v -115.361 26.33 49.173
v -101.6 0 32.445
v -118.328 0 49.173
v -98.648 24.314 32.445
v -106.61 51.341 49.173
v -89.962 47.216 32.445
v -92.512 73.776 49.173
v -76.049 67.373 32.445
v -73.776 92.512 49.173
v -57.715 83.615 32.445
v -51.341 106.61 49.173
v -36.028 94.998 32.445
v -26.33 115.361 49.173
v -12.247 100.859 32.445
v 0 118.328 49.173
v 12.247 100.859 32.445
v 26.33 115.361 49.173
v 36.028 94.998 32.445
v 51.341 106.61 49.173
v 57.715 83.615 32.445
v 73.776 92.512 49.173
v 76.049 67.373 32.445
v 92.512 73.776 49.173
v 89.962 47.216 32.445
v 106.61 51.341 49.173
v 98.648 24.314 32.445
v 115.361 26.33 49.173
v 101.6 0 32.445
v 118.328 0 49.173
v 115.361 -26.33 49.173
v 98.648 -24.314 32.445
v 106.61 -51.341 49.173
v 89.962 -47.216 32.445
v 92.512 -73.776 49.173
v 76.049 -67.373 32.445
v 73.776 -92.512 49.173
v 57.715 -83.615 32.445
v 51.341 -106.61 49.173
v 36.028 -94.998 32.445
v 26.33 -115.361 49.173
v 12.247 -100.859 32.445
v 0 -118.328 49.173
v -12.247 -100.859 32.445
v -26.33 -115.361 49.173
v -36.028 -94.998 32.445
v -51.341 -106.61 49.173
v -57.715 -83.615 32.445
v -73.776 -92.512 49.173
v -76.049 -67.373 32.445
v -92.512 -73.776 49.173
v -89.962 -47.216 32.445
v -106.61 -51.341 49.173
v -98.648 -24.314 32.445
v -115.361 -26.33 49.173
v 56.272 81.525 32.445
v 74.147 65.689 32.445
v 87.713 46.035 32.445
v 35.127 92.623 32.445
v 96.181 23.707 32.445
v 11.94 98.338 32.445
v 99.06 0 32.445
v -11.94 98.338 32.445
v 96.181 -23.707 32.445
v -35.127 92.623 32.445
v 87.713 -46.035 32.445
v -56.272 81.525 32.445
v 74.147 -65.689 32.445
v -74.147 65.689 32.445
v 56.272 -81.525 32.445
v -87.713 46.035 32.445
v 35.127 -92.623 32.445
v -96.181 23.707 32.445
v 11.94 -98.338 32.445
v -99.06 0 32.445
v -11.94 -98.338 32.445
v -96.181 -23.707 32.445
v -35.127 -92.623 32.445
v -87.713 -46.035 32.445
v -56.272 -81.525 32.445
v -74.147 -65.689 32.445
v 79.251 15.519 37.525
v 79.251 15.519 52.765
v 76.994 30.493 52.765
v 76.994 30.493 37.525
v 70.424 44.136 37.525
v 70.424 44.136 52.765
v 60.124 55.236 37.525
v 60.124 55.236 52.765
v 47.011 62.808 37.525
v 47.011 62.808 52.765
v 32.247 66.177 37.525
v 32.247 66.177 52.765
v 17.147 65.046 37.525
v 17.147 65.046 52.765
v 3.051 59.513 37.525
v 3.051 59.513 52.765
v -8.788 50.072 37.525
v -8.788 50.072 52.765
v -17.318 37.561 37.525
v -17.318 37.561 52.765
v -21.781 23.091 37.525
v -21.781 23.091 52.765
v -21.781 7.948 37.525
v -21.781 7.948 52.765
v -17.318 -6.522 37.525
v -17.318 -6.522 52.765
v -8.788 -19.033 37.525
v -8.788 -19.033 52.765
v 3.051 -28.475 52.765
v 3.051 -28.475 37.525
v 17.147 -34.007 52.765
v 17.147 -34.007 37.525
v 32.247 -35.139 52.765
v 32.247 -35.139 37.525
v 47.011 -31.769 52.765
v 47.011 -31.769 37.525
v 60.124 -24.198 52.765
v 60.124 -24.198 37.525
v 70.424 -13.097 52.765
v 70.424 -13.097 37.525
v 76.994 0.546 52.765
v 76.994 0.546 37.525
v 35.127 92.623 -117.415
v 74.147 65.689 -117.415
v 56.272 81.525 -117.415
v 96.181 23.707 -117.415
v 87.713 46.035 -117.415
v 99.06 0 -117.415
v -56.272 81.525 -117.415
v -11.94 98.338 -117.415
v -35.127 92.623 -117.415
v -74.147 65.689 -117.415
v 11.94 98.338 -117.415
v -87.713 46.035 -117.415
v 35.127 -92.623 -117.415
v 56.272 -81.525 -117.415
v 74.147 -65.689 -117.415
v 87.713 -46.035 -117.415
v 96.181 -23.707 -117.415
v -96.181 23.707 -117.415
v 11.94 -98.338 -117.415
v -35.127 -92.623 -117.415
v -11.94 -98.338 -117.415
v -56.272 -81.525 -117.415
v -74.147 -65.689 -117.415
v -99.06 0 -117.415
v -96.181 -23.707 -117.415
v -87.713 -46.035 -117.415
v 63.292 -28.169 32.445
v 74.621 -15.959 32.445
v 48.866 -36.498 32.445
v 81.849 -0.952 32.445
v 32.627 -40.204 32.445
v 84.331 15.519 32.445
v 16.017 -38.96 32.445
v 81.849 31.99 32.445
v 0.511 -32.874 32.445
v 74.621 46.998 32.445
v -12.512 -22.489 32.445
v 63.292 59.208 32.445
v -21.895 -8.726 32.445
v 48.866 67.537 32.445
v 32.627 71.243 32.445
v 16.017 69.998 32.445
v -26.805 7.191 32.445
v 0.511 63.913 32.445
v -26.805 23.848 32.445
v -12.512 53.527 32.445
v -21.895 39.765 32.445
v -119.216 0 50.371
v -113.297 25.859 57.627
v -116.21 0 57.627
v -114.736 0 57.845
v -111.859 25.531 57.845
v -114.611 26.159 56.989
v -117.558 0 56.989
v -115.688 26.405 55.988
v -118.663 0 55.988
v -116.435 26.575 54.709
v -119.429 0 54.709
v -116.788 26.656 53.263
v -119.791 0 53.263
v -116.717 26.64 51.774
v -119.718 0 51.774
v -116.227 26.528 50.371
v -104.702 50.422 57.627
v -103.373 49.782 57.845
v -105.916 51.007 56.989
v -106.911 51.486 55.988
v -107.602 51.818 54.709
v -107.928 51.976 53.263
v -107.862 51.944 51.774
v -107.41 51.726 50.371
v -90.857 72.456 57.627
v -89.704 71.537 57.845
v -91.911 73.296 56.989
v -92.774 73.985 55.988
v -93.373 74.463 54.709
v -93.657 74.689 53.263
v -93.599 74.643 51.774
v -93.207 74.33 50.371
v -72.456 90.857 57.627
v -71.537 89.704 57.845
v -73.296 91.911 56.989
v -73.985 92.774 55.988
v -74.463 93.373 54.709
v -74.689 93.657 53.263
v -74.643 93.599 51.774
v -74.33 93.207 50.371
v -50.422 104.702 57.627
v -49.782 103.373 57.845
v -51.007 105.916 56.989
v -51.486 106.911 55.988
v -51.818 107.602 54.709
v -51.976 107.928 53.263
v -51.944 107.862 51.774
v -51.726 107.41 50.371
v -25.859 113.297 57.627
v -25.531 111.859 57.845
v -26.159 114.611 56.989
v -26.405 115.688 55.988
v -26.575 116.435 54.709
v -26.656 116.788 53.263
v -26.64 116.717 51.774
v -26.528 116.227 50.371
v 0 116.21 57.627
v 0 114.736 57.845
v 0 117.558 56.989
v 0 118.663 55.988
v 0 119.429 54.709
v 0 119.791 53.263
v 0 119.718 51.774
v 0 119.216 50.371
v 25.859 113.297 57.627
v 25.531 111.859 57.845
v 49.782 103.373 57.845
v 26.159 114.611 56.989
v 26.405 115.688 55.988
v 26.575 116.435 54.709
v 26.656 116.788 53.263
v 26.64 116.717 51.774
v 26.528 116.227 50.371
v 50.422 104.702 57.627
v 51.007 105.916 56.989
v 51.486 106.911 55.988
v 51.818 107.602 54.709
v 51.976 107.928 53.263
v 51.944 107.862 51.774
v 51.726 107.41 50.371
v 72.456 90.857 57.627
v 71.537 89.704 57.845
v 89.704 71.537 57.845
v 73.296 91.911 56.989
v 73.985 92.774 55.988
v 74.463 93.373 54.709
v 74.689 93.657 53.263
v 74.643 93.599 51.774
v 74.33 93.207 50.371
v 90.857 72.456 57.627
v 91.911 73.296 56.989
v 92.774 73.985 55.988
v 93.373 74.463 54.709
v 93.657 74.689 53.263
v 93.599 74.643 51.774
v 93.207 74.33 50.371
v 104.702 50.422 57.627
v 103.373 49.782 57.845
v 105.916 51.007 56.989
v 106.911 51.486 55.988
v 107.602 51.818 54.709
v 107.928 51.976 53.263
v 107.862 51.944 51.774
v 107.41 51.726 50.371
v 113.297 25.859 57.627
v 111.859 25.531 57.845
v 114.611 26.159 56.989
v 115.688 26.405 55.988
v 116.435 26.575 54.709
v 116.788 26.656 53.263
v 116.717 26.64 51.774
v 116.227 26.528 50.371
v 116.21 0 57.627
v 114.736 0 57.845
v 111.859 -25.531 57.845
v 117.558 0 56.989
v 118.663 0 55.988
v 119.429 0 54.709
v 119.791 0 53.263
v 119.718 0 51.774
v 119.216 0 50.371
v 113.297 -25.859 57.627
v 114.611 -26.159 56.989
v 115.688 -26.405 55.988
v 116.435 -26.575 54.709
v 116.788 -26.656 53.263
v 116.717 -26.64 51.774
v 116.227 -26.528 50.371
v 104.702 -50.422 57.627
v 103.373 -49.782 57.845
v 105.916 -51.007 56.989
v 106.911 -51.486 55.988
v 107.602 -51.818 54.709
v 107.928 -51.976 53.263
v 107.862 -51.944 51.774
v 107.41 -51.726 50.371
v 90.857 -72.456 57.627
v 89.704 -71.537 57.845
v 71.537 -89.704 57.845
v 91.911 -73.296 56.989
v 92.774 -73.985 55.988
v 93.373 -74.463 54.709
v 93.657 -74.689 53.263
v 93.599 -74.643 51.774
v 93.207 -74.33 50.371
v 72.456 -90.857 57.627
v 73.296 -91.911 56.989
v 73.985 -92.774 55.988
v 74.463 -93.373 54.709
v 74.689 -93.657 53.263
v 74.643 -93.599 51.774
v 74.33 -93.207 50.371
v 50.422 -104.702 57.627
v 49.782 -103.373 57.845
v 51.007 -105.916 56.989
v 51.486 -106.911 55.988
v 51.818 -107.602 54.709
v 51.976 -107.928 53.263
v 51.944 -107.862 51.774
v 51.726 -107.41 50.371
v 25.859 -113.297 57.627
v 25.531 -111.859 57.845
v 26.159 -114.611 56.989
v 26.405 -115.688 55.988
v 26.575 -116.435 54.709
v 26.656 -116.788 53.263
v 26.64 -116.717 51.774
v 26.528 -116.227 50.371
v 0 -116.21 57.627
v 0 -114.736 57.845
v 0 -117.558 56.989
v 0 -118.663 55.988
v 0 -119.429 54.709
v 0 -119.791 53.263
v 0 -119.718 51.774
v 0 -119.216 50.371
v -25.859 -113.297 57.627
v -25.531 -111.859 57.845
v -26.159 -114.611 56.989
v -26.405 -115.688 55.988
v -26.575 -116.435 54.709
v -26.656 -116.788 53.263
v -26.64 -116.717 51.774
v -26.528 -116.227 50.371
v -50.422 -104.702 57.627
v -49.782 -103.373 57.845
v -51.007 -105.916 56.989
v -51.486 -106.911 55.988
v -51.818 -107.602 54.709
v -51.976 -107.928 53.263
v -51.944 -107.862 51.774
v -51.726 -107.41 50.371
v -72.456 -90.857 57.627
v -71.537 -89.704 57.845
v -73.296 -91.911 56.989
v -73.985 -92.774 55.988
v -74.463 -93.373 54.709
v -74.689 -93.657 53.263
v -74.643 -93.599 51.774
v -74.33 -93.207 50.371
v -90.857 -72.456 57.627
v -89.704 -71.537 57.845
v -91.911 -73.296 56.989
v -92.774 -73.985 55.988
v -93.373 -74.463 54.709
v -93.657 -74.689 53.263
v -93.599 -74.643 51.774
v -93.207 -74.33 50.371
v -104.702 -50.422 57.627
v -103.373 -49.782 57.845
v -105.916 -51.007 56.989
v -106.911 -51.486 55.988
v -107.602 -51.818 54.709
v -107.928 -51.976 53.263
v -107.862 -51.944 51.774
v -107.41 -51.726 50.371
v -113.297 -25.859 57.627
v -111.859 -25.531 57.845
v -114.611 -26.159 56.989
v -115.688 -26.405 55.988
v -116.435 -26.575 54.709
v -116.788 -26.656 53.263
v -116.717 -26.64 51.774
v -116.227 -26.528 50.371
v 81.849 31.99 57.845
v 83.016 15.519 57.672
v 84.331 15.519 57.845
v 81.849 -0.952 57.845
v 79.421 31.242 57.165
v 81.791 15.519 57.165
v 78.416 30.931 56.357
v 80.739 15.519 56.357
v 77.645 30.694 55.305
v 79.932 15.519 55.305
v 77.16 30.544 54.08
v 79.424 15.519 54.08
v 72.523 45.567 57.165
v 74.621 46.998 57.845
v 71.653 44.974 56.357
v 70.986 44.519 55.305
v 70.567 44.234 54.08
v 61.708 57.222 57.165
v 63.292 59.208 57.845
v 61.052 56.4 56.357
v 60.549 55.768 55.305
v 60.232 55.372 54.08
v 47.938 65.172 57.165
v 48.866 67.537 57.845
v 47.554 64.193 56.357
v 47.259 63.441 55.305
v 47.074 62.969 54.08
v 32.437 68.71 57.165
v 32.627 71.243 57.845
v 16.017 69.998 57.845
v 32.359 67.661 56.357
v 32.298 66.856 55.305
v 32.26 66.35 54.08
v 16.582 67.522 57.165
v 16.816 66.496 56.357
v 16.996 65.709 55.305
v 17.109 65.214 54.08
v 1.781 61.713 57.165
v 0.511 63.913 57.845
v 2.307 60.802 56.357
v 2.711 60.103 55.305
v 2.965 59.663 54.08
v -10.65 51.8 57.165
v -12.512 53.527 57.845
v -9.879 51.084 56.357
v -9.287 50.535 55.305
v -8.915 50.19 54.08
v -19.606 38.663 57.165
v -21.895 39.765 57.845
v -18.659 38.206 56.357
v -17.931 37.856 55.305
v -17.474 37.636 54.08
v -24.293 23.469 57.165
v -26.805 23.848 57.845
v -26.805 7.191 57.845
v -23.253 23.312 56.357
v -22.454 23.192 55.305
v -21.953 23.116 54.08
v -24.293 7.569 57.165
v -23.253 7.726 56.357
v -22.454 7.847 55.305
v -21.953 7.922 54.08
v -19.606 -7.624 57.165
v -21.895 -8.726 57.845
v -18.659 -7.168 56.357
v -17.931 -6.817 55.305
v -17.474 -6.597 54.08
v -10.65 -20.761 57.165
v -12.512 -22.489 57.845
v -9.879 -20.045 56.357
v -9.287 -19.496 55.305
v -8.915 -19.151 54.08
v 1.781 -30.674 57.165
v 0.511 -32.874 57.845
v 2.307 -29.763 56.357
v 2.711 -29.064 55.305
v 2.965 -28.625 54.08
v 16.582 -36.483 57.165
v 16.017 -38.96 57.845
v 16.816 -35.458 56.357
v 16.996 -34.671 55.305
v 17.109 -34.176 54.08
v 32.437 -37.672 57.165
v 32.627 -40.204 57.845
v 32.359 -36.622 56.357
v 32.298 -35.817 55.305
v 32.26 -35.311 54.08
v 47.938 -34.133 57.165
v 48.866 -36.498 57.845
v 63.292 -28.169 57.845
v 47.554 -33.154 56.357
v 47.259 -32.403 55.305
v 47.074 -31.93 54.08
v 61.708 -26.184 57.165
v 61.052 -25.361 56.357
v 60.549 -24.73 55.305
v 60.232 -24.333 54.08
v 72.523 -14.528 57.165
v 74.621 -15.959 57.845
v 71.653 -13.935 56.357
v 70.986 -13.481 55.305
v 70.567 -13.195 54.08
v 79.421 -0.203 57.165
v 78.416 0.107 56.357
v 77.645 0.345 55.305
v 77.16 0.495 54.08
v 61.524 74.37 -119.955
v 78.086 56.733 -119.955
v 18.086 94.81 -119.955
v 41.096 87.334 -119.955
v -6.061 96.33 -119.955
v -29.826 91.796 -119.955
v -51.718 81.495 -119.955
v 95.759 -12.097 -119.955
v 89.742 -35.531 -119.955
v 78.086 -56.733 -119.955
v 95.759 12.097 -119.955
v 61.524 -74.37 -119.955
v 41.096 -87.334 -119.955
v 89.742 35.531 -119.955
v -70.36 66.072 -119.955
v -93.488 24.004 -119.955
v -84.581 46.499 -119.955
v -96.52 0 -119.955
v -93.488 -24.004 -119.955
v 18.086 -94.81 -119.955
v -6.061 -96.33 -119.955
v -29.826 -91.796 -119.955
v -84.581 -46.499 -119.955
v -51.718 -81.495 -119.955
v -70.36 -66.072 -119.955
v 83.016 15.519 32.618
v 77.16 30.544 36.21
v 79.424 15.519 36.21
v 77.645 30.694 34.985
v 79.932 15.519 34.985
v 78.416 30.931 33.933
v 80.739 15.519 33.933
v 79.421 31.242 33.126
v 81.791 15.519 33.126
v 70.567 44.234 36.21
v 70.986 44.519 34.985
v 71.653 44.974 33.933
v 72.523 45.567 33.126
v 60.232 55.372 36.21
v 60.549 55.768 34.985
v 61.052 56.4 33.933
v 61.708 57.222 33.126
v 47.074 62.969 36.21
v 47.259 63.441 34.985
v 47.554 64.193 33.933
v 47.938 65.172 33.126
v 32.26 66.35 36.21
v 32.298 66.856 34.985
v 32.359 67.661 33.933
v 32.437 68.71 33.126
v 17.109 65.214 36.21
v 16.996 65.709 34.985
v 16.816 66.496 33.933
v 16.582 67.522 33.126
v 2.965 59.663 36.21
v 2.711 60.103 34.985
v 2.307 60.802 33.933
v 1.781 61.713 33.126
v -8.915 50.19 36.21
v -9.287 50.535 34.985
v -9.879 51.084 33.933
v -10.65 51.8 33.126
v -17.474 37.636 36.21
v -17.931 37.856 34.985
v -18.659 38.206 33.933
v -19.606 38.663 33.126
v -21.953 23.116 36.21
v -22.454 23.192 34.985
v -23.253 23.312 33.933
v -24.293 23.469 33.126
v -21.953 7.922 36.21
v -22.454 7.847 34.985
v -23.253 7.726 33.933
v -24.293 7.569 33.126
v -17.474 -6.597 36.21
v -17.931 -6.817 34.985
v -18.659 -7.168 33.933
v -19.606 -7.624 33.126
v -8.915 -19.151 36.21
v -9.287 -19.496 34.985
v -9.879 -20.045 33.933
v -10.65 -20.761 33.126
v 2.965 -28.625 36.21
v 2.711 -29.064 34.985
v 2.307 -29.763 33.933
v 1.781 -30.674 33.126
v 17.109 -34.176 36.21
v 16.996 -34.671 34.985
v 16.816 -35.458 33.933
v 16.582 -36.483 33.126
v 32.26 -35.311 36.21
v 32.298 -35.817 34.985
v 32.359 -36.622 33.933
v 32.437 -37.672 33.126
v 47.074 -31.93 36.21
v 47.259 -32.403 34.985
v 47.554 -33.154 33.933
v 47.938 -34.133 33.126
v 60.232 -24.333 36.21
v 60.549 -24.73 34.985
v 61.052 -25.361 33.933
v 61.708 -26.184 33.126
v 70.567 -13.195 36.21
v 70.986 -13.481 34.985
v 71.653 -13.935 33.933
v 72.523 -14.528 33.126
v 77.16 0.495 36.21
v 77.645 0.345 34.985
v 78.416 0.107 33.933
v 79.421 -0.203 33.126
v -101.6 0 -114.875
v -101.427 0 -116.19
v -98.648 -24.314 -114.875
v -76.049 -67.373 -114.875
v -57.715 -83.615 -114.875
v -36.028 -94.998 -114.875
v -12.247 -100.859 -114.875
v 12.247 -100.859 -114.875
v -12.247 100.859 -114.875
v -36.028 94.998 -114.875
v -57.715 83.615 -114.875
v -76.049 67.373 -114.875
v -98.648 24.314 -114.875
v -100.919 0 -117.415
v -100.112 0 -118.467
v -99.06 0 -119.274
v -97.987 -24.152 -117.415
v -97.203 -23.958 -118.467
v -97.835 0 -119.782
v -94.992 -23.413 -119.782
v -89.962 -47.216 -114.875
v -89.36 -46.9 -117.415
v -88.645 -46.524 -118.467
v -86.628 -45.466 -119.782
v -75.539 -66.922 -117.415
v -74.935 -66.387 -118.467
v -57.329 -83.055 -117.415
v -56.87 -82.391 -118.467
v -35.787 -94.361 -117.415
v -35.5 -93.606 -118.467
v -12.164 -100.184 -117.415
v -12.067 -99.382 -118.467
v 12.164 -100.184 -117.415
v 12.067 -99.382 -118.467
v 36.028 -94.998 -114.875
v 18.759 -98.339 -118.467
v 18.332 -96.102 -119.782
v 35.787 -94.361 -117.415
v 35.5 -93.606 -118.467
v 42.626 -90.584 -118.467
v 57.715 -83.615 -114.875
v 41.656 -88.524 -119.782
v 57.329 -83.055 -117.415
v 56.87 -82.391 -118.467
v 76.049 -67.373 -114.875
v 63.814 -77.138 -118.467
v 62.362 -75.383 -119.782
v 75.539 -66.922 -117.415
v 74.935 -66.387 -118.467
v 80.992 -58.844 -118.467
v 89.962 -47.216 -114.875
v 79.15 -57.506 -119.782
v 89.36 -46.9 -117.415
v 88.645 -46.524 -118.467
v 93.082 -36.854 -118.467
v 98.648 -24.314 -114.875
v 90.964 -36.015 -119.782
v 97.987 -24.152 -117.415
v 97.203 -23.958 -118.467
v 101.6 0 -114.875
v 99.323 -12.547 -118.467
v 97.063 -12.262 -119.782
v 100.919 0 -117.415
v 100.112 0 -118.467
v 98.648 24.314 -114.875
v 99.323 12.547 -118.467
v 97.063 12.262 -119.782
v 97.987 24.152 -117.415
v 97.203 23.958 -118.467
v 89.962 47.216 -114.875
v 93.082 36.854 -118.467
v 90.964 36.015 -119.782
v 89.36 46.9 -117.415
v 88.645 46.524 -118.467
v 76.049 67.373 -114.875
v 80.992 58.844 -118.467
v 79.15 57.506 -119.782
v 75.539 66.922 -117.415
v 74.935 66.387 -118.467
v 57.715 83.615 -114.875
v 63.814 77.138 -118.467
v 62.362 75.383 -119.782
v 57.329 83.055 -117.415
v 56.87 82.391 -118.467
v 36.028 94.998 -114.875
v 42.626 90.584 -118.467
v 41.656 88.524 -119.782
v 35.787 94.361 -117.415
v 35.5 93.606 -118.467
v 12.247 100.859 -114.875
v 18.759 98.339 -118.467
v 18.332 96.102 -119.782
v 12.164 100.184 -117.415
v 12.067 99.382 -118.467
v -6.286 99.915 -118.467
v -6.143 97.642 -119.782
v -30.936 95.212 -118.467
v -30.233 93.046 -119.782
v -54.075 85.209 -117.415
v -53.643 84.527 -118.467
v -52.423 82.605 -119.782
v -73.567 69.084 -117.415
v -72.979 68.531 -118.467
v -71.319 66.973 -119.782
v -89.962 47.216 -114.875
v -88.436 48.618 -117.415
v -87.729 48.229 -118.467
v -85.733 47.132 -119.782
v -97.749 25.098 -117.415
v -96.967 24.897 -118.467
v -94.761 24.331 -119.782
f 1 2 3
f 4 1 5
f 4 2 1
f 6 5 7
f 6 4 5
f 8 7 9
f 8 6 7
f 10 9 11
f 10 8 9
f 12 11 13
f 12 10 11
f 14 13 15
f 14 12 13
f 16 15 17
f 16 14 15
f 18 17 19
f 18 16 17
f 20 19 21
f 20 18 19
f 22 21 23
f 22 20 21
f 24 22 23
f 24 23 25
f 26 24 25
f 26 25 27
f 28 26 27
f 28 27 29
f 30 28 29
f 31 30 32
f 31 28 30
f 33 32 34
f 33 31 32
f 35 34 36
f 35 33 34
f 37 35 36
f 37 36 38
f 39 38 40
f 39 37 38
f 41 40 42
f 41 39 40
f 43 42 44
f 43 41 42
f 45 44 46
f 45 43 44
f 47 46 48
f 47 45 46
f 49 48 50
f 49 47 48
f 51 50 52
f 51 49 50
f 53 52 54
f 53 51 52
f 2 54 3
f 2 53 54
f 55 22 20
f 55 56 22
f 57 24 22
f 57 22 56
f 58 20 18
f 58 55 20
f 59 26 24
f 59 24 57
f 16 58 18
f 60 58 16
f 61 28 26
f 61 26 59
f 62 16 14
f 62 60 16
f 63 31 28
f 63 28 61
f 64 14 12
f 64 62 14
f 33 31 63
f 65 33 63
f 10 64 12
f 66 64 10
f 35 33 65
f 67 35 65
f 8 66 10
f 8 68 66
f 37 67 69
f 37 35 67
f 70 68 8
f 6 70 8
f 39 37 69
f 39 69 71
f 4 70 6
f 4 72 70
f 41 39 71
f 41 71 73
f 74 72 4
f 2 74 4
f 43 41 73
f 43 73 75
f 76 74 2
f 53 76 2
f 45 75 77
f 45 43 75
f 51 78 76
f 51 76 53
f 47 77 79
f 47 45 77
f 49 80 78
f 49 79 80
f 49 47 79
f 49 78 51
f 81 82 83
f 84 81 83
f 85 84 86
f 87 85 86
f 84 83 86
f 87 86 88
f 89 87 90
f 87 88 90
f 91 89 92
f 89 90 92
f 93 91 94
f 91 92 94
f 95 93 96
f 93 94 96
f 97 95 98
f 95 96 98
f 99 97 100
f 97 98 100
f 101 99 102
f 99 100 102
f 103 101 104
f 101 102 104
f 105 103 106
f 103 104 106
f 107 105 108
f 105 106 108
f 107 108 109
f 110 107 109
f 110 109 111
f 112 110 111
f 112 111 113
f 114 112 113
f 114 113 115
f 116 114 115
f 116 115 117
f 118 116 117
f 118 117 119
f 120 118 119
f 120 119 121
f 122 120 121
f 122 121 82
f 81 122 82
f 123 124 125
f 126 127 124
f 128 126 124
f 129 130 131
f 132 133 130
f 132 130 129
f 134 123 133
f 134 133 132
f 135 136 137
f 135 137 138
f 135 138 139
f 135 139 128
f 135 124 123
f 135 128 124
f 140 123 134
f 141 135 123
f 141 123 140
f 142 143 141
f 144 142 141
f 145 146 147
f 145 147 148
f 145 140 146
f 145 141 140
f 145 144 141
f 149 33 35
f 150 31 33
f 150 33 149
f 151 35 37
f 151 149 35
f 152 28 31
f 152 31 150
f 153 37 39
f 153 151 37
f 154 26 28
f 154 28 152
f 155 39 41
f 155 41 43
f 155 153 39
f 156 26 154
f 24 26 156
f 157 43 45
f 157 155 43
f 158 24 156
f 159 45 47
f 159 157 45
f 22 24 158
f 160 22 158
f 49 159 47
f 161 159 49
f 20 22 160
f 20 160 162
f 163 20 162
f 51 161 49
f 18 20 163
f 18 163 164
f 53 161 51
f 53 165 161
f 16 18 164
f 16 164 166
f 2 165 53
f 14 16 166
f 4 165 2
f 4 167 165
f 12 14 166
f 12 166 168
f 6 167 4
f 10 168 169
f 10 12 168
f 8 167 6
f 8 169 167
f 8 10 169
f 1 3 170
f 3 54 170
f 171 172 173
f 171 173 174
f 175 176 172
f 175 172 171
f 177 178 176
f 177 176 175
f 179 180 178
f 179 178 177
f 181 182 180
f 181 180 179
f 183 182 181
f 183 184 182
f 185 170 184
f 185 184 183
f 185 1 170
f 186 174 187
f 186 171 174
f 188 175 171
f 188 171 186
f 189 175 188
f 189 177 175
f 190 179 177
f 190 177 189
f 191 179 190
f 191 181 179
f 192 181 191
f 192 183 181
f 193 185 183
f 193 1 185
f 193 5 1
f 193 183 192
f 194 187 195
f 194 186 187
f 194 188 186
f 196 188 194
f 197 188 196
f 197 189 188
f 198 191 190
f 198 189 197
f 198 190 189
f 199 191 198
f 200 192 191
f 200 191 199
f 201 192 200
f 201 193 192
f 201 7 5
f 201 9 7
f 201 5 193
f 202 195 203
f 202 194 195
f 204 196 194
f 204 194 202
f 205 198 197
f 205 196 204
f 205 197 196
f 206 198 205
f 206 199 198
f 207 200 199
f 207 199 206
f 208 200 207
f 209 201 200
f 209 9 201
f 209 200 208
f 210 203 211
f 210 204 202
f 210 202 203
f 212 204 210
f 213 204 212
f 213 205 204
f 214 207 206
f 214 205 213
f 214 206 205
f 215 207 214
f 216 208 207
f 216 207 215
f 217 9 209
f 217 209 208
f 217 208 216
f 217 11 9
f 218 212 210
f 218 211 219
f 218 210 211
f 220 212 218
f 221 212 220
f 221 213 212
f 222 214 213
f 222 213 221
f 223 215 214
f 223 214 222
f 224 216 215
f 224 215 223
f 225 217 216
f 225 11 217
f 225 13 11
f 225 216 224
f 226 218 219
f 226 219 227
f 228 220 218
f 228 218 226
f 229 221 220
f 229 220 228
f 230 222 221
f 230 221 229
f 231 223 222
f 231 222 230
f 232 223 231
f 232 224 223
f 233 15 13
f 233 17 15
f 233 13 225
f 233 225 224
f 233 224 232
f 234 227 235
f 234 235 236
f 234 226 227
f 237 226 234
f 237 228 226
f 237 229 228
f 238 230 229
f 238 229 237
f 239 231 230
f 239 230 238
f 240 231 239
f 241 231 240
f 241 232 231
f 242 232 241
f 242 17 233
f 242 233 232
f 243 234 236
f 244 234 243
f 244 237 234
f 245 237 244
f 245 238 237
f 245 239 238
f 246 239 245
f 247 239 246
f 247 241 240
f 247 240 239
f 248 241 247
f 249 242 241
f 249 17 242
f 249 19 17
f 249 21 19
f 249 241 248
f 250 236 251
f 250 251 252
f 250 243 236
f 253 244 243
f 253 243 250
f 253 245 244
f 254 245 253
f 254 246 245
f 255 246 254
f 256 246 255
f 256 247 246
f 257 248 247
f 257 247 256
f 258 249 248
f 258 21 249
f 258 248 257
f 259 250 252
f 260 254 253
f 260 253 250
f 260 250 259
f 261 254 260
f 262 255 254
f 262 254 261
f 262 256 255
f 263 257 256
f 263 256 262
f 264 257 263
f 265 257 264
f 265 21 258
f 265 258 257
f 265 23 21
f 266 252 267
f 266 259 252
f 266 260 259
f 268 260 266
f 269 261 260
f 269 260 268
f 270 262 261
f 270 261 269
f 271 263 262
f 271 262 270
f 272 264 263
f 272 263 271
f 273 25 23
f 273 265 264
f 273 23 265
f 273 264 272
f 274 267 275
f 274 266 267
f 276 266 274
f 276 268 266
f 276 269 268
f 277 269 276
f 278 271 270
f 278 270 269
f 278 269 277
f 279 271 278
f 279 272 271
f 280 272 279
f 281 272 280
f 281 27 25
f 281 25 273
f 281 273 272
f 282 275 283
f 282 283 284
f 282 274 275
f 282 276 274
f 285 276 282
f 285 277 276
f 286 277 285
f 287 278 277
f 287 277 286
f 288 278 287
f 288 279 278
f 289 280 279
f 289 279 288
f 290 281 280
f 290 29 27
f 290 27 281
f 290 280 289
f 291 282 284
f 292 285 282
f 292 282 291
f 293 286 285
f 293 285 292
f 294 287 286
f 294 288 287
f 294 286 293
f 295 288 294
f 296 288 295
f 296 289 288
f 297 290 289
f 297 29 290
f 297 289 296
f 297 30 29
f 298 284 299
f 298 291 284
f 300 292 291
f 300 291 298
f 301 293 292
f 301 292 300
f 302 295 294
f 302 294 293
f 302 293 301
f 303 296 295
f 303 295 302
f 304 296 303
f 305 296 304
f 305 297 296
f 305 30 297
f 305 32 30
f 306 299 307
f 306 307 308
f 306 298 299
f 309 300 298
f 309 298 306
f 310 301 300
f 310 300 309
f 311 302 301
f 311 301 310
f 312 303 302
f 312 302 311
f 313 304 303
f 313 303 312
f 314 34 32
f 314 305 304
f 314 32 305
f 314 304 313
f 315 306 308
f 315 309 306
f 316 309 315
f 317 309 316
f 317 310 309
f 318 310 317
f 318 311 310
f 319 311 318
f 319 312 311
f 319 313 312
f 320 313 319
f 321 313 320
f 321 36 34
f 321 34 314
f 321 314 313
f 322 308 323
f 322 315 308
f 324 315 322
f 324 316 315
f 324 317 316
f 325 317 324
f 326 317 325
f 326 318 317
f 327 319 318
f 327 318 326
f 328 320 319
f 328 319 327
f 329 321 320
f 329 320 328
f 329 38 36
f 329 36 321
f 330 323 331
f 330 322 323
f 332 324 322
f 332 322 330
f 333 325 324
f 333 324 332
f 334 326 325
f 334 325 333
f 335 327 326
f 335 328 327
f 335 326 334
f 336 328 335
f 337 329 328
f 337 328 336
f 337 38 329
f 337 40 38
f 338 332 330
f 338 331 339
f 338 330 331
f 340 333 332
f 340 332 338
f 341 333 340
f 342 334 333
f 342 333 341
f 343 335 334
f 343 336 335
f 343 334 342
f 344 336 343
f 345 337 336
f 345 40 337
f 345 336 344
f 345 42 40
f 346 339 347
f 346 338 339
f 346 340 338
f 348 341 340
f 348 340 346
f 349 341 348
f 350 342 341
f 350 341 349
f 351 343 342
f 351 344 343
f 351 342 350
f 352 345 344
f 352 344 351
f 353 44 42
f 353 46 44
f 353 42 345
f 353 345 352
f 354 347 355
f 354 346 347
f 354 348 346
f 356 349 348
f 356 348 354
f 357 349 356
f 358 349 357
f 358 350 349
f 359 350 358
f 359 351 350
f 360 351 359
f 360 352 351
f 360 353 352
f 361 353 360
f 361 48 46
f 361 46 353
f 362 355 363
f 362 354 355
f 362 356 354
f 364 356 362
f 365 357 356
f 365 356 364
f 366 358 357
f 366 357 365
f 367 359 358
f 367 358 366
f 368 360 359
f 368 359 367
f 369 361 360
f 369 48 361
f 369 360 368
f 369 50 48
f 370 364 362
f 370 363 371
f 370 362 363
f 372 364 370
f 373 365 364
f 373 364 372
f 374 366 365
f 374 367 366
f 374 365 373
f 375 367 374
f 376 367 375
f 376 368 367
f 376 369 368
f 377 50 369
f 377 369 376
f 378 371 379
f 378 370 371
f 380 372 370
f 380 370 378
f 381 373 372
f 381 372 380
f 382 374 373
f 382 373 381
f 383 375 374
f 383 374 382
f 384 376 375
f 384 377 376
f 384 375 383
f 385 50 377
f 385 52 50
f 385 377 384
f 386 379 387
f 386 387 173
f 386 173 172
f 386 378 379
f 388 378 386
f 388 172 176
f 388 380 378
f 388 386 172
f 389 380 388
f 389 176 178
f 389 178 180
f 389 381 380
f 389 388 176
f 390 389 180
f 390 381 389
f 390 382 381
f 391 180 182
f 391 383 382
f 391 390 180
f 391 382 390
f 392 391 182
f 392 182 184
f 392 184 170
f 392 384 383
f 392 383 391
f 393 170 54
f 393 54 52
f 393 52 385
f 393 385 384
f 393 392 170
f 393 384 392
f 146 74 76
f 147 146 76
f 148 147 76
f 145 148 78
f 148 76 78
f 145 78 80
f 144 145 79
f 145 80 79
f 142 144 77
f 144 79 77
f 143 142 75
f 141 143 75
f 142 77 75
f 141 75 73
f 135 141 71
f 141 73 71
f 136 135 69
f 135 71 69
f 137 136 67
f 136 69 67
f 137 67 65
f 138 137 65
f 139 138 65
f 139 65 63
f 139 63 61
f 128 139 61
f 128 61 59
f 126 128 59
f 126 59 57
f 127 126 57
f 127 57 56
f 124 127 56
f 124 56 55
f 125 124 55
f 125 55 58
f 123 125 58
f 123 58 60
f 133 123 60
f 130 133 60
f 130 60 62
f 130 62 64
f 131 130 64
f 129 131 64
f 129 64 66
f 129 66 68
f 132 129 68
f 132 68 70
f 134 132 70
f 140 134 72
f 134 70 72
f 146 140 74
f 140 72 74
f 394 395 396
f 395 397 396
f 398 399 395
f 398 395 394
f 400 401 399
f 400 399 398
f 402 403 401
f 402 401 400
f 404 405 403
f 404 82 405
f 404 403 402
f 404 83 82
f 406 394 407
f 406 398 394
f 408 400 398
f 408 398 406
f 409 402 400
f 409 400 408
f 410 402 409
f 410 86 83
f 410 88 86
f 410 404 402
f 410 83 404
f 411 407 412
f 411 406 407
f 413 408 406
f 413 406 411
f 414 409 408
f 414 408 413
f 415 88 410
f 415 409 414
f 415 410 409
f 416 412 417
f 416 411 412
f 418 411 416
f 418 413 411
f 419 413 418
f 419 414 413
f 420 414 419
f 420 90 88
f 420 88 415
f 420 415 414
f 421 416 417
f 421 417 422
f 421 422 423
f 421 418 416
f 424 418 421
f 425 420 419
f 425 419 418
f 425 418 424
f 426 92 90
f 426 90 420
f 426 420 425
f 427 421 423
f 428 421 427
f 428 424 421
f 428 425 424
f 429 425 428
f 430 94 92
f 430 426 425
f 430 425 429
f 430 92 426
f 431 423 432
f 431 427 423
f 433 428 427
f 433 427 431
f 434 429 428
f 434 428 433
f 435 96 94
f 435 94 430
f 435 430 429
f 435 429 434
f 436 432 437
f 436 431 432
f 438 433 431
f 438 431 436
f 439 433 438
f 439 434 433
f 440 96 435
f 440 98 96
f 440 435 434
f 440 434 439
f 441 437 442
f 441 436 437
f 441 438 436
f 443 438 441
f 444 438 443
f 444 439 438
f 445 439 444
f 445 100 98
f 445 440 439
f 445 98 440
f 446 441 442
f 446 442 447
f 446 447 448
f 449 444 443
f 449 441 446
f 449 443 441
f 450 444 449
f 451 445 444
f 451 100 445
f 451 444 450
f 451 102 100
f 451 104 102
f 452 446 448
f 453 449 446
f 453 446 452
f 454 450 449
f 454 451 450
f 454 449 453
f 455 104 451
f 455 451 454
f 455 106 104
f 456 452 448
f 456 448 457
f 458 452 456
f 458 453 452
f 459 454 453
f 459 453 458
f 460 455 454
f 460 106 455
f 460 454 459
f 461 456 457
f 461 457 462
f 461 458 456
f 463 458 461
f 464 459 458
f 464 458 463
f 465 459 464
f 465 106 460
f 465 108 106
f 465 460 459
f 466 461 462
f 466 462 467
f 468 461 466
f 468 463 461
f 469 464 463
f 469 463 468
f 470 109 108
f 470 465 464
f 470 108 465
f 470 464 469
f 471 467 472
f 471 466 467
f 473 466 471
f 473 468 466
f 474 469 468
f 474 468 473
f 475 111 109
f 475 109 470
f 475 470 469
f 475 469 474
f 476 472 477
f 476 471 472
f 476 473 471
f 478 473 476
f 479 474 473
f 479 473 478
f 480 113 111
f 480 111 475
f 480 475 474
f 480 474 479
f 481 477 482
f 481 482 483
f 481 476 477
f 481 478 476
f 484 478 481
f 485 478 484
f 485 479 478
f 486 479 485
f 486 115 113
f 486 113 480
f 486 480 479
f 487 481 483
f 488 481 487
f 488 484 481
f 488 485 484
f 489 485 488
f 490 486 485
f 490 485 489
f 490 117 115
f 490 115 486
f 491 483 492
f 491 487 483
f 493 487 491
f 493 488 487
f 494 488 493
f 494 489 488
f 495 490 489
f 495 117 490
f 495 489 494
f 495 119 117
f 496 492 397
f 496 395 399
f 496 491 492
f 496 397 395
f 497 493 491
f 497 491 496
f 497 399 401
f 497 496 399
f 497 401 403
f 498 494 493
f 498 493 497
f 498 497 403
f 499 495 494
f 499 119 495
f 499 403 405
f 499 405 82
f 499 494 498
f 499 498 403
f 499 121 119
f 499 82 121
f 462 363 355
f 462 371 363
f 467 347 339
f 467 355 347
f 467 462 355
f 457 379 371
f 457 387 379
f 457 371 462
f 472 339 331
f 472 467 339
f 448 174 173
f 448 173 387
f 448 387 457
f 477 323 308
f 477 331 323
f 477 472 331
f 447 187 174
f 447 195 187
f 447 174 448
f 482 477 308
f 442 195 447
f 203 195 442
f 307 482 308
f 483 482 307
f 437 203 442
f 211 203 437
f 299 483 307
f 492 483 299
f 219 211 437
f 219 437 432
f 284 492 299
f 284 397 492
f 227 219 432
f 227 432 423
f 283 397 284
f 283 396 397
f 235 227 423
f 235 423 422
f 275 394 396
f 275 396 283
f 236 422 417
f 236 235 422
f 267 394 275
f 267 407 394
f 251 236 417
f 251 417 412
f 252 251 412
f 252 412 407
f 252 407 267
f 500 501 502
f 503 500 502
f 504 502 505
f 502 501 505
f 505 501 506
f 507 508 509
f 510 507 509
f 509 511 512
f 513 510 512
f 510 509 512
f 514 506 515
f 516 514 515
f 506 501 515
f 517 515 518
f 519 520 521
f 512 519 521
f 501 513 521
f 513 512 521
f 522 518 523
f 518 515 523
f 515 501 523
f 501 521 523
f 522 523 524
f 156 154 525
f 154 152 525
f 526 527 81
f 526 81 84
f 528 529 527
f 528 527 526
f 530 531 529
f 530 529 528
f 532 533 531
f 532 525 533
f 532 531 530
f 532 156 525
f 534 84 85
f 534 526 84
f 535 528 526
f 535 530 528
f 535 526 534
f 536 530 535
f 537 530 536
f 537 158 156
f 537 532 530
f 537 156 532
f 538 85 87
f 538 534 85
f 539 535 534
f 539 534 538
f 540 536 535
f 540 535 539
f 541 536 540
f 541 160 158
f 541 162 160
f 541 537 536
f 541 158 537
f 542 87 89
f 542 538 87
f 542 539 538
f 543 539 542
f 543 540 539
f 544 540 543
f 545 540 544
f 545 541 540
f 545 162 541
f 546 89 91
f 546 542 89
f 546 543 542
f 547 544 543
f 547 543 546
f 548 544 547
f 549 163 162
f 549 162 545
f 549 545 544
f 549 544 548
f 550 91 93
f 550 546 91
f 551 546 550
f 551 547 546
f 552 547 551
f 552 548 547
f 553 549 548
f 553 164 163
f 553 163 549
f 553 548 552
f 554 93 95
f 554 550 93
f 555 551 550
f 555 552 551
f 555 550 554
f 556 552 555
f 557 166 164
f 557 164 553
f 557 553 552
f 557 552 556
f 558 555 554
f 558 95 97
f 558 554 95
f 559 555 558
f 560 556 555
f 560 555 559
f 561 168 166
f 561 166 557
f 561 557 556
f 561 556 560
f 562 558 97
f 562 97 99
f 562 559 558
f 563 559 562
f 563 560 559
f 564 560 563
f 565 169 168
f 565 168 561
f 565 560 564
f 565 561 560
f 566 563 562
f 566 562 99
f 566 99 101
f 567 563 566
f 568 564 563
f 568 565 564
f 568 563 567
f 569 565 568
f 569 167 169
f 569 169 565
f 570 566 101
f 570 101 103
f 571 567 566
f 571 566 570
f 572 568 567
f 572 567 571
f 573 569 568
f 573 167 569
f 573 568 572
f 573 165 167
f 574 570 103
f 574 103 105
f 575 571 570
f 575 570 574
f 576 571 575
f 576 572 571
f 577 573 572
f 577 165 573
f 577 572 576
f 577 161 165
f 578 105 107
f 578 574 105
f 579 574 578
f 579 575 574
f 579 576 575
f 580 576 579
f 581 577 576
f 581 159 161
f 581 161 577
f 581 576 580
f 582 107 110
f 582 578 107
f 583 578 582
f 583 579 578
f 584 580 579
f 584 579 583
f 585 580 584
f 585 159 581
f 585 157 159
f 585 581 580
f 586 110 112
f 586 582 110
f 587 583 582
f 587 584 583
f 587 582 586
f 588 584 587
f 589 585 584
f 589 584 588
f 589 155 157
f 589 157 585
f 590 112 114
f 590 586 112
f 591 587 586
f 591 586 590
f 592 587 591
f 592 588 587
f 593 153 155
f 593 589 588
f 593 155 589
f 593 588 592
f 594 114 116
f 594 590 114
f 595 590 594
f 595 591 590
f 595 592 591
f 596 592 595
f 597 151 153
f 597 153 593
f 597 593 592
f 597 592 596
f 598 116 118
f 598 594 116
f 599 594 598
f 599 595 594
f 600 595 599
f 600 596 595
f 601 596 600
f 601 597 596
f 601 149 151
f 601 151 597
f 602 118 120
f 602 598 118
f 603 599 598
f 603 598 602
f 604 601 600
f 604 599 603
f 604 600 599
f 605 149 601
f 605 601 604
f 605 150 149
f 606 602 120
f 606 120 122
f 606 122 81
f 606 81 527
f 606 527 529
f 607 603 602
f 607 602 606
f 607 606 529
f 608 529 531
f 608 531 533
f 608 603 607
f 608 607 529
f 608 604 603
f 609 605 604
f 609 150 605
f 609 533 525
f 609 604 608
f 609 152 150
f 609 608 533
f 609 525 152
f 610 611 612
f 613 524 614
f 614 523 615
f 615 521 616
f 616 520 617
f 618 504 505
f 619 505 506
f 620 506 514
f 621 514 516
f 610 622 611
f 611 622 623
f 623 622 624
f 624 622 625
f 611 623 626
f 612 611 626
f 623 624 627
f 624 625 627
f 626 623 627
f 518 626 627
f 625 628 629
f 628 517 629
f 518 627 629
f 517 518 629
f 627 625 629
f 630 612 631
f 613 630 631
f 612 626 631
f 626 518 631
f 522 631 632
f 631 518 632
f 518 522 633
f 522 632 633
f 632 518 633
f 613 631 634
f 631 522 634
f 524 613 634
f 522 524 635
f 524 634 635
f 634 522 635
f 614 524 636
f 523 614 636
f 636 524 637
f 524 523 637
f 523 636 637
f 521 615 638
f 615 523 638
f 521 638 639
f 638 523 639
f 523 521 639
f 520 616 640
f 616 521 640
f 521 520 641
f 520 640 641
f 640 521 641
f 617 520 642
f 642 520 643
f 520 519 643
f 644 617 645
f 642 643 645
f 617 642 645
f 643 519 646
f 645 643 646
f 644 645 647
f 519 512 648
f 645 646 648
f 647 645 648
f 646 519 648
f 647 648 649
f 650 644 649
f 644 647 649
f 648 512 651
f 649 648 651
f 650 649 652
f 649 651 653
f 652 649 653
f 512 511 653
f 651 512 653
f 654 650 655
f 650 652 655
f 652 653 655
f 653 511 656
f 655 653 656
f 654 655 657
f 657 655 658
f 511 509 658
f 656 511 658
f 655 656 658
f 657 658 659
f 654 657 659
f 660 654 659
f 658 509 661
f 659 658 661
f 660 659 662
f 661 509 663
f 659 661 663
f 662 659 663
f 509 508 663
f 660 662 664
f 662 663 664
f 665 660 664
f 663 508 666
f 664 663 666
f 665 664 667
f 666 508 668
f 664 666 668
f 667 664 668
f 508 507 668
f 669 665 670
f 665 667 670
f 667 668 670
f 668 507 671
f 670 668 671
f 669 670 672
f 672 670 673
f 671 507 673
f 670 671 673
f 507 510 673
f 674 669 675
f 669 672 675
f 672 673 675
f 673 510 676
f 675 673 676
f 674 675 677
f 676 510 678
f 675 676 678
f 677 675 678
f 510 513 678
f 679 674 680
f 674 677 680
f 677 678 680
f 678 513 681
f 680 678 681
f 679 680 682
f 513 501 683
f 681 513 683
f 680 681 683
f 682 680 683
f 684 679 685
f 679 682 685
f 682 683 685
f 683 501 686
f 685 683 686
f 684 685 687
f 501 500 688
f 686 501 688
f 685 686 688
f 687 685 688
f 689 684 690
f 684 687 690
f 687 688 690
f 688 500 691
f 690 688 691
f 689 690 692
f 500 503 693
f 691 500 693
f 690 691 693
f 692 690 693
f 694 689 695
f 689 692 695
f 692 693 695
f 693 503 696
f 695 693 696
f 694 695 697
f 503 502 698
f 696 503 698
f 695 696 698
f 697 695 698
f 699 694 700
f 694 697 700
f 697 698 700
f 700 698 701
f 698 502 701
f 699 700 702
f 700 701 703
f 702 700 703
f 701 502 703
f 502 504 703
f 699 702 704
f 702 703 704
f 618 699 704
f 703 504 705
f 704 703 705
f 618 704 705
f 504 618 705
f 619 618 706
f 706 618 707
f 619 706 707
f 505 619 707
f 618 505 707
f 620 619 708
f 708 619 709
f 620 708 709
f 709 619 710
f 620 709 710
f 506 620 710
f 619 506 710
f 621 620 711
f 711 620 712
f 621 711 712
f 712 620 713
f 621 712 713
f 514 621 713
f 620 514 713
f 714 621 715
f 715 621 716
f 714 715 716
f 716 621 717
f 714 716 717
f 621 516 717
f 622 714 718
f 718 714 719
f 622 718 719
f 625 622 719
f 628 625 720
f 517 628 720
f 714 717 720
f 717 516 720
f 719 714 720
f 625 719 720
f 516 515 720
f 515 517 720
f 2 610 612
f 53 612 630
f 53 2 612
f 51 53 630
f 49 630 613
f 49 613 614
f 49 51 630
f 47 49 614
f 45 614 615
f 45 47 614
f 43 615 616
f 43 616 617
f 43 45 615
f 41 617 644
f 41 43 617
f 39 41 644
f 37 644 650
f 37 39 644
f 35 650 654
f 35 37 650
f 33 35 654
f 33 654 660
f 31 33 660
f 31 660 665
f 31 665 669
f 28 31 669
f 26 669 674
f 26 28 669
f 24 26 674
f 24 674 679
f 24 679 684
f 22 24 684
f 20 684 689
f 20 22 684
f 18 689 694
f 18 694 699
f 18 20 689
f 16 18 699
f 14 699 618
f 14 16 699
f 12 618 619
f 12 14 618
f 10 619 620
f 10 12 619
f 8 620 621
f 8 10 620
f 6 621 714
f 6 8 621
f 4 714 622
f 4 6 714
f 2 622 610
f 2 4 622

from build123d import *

# Parameters (mm, degrees)
F2_R     = 50.8
F3_DEPTH = 31.496
F4_W     = 101.6
F4_H     = 152.4
F6_T     = -2.54
F7_R     = 5.08
F7_2_R   = 5.08
F8_R     = 5.08


with BuildPart() as f1:
    # F0 (on Front) → F1 (revolve)
    with BuildSketch(Plane.XZ):
        Polygon((0, 57.8452544079), (-127, 57.8452544079), (-101.6, 32.4452544079), (0, 32.4452544079), align=None)
    revolve(axis=Axis((0, 0, 45.1452544079), (0, 0, -1)))

    # F2 (on face) → F3 (cut)
    with BuildSketch(Plane.XY.offset(57.8452544079)):
        with Locations((28.4512005746, 15.5193470418)):
            Circle(F2_R)
    extrude(amount=-F3_DEPTH, mode=Mode.SUBTRACT)

    # F7
    f7_edges = [f1.edges().sort_by_distance(p)[0] for p in [
        (127, 0, 57.845254),
        (-22.348799, 15.519347, 57.845254),
    ]]
    fillet(f7_edges, radius=F7_R)

    # F8
    f8_edges = [f1.edges().sort_by_distance(p)[0] for p in [
        (79.251201, 15.519347, 42.605254),
        (-22.348799, 15.519347, 52.765254),
        (-22.348799, 15.519347, 32.445254),
    ]]
    fillet(f8_edges, radius=F8_R)


with BuildPart() as f5:
    # F4 (on Front) → F5 (revolve)
    with BuildSketch(Plane.XZ):
        with Locations((-50.8, -43.7547455921)):
            Rectangle(F4_W, F4_H)
    revolve(axis=Axis((0, 0, -43.7547455921), (0, 0, 1)))

    # F6
    f6_openings = [f5.faces().sort_by_distance(p)[0] for p in [
        (0, 0, 32.445254),
    ]]
    offset(amount=F6_T, openings=f6_openings)

    # F7#2
    f7_2_edges = [f5.edges().sort_by_distance(p)[0] for p in [
        (101.6, 0, -119.954746),
    ]]
    fillet(f7_2_edges, radius=F7_2_R)


solid = Compound([f1.part, f5.part])
